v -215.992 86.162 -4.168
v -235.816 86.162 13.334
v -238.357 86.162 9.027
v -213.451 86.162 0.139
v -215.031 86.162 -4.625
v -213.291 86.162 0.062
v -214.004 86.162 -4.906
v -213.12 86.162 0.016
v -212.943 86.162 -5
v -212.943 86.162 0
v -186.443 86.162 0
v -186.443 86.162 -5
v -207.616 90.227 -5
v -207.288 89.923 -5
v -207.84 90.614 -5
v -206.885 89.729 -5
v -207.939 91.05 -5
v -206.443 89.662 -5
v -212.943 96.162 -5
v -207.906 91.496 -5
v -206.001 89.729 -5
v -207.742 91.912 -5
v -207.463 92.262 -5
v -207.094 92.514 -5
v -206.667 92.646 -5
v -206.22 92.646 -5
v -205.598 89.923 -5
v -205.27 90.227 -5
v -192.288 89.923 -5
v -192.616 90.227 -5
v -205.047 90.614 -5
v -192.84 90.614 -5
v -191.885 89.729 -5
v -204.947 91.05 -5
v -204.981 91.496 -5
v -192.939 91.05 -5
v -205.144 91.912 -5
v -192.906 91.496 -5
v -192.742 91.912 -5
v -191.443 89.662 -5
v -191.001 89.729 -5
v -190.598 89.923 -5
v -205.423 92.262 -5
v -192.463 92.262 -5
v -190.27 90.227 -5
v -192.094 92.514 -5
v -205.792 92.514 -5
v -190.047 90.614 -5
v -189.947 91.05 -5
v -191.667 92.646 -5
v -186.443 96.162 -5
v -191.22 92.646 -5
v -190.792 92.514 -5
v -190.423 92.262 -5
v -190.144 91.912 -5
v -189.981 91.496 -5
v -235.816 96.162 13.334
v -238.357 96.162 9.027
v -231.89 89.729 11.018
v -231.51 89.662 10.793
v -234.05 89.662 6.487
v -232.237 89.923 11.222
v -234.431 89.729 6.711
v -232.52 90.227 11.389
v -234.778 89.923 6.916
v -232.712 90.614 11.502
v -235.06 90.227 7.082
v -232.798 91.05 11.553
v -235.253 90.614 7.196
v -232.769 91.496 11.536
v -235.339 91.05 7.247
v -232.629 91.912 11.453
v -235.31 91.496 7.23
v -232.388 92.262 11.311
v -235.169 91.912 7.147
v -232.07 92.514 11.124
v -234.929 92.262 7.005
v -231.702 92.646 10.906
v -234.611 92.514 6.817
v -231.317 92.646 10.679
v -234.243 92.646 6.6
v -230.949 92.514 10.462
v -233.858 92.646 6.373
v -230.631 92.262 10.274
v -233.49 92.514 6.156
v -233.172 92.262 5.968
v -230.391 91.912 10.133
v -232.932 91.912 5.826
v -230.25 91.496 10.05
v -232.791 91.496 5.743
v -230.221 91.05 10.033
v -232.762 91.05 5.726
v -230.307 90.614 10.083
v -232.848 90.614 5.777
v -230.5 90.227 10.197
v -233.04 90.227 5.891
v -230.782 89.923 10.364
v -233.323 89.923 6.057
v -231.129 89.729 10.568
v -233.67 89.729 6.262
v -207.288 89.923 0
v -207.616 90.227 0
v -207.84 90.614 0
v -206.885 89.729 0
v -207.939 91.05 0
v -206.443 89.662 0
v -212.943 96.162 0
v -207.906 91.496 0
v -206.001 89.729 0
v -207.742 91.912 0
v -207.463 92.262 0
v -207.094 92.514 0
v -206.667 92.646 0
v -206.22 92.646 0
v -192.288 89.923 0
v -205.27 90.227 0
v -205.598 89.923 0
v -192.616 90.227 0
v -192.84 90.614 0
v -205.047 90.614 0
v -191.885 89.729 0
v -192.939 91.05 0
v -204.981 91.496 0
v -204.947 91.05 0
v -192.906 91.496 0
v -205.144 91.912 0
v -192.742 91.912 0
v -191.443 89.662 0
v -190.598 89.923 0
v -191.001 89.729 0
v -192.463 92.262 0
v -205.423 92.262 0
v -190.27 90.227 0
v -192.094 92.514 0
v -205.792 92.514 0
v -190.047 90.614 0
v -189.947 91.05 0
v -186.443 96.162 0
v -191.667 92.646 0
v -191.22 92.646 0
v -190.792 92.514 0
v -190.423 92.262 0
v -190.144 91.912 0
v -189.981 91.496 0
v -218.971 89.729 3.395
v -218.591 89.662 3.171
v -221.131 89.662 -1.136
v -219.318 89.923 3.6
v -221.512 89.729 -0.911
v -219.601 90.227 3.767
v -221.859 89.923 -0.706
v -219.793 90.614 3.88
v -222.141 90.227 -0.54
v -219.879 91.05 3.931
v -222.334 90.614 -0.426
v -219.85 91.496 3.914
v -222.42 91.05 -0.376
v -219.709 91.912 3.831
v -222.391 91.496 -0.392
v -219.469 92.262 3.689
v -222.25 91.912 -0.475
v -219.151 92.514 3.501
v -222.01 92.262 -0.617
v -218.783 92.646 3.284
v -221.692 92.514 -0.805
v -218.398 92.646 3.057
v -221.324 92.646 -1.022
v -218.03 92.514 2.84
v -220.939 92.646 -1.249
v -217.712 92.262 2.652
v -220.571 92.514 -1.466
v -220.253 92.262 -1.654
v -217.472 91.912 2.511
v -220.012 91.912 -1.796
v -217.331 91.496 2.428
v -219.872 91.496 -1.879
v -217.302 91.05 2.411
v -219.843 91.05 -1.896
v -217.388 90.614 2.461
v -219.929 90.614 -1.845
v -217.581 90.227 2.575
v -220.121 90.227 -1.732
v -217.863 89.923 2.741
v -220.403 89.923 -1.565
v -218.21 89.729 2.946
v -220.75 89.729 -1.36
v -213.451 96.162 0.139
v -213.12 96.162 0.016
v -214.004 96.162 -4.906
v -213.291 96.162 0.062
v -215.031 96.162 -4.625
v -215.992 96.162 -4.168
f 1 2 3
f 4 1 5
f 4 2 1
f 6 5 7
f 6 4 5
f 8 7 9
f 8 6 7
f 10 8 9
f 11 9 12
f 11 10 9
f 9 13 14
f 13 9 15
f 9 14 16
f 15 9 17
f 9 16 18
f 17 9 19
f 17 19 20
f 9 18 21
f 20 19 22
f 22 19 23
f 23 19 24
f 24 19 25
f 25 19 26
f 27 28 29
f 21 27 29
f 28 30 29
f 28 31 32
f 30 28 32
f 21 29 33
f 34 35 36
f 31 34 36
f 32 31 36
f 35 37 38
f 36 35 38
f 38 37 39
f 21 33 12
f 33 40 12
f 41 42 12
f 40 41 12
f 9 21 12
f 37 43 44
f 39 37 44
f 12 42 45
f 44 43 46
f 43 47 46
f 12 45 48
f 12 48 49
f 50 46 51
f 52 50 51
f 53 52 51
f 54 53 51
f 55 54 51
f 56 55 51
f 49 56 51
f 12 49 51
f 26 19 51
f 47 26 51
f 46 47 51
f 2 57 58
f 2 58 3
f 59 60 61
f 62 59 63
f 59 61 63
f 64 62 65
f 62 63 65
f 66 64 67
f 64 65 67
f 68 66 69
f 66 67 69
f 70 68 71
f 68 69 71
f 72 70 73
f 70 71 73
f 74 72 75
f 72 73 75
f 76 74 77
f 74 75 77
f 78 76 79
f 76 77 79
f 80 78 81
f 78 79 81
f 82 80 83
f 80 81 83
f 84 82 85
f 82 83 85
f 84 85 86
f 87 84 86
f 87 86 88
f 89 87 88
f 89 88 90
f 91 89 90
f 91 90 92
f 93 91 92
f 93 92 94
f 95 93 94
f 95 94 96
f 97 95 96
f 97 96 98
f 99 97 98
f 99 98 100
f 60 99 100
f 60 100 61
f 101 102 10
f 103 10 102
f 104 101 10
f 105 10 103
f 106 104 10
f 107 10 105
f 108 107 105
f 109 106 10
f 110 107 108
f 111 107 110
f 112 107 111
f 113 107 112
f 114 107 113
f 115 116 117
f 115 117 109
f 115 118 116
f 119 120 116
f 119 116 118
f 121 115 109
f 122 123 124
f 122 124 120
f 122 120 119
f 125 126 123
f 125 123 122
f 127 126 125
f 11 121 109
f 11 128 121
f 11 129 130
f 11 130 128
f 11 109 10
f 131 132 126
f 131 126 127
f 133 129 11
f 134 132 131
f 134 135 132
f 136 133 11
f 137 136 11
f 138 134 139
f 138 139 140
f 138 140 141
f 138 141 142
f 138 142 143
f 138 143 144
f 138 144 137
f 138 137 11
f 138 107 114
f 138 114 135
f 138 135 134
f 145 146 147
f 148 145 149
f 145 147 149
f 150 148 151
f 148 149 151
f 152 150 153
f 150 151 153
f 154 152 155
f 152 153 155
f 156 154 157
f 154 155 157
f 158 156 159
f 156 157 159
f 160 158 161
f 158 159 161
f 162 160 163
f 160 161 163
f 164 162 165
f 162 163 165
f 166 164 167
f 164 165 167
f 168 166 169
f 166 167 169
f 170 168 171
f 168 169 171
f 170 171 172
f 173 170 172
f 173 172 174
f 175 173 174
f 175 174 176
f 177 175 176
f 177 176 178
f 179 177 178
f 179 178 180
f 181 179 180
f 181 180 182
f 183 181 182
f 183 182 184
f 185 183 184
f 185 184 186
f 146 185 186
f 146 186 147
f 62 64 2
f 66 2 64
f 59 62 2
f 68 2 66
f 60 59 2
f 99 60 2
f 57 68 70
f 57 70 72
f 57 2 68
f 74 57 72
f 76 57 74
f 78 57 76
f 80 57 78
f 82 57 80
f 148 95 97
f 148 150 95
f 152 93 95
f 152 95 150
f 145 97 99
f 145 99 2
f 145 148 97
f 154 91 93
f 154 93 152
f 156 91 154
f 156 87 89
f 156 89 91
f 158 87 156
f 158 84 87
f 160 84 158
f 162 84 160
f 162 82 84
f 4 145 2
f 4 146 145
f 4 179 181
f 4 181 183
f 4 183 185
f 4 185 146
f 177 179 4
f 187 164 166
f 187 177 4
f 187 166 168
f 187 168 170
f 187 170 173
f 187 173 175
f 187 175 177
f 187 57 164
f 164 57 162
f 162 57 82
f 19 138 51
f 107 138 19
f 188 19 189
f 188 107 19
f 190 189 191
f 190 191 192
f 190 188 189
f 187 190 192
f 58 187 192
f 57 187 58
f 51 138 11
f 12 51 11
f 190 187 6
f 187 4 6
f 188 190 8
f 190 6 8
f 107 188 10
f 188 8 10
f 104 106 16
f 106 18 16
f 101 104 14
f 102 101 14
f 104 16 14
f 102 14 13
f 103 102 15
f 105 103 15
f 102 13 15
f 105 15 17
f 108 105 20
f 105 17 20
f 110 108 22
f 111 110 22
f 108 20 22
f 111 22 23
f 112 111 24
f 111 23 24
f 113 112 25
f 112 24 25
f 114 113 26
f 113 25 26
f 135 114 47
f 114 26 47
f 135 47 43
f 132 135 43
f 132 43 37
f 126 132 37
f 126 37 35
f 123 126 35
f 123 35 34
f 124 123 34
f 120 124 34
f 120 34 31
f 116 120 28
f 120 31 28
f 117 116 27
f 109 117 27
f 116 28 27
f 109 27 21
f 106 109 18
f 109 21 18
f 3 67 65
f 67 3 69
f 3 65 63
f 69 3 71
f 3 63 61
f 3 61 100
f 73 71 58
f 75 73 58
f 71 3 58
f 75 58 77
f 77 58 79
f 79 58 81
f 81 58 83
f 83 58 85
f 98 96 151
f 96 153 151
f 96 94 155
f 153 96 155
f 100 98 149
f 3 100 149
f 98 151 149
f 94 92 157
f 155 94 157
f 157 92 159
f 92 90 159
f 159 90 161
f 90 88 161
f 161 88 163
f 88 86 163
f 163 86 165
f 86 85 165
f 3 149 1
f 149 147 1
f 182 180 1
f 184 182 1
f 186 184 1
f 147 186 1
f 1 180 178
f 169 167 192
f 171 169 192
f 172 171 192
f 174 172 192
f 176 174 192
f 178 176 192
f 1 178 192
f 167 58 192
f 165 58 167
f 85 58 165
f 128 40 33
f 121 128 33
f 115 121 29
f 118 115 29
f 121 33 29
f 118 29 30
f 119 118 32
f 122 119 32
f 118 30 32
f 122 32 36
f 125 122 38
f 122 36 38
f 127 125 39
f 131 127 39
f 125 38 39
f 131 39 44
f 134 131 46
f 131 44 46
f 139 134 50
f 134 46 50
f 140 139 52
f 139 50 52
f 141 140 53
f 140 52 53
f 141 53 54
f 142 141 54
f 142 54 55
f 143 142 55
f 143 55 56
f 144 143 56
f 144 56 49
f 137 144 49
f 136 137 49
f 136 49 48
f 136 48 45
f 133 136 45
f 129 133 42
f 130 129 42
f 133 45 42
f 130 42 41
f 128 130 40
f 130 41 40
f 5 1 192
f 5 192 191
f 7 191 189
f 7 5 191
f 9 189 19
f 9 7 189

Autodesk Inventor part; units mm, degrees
ref_plane "YZ Plane" through (0, 0, 0) normal (1, 0, 0) x (0, 1, 0)
ref_plane "XZ Plane" through (0, 0, 0) normal (0, 1, 0) x (-1, 0, 0)
ref_plane "XY Plane" through (0, 0, 0) normal (0, 0, 1) x (1, 0, 0)
sketch "スケッチ1" plane through (0, 0, 0) normal (0, 0, 1) x (1, 0, 0)
  circle A0 centre (-137.47813, 108.715013) radius 1.5
  circle A1 centre (-137.47813, 108.715013) radius 4
  circle A2 centre (-84.833891, 108.084965) radius 1.5
  circle A3 centre (-84.833891, 108.084965) radius 4
  arc A4 (-118.947299, 71.123436) -> (-117.73095, 71.382243) centre (-118.502117, 72.018876) ccw
  arc A5 (-114.600271, 73.907195) -> (-117.73095, 71.382243) centre (-110, 65) ccw
  arc A6 (-114.600271, 73.907195) -> (-114.089743, 75.041147) centre (-115.059151, 74.795694) ccw
  line L0 (-114.089743, 75.041147) -> (-119.33341, 95.750821)
  arc A7 (-119.33341, 95.750821) -> (-120.080809, 96.480412) centre (-120.302818, 95.505368) ccw
  arc A8 (-121.730917, 97.23053) -> (-120.080809, 96.480412) centre (-119.081767, 100.868113) ccw
  arc A9 (-121.730917, 97.23053) -> (-122.772044, 97.31398) centre (-122.319616, 96.422178) ccw
  line L1 (-122.772044, 97.31398) -> (-145.176978, 85.94755)
  arc A10 (-145.176978, 85.94755) -> (-145.169733, 84.160308) centre (-144.724551, 85.055748) ccw
  line L2 (-145.169733, 84.160308) -> (-118.947299, 71.123436)
  arc A11 (-111.181518, 75.777506) -> (-110.19287, 75.023145) centre (-110.212109, 76.022959) ccw
  arc A12 (-100.681376, 68.696468) -> (-110.19287, 75.023145) centre (-110, 65) ccw
  arc A13 (-100.681376, 68.696468) -> (-99.603497, 68.076257) centre (-99.751838, 69.065193) ccw
  line L3 (-99.603497, 68.076257) -> (-77.042446, 71.460414)
  arc A14 (-77.042446, 71.460414) -> (-76.670938, 73.303609) centre (-77.190786, 72.449351) ccw
  line L4 (-76.670938, 73.303609) -> (-114.637331, 96.407596)
  arc A15 (-114.637331, 96.407596) -> (-116.126588, 95.307885) centre (-115.15718, 95.553338) ccw
  line L5 (-116.126588, 95.307885) -> (-111.181518, 75.777506)
  circle A16 centre (-150.294817, 85.033166) radius 1.5
  arc A17 (-124.129325, 99.989384) -> (-123.581755, 100.878808) centre (-124.581752, 100.881185) ccw
  arc A18 (-114.594354, 100.531773) -> (-123.581755, 100.878808) centre (-119.081767, 100.868113) ccw
  arc A19 (-114.594354, 100.531773) -> (-114.117, 99.602773) centre (-113.597151, 100.457031) ccw
  line L6 (-114.117, 99.602773) -> (-73.405222, 74.828115)
  arc A20 (-73.405222, 74.828115) -> (-72.36076, 74.831033) centre (-72.885373, 75.682374) ccw
  arc A21 (-73.660486, 68.382589) -> (-72.36076, 74.831033) centre (-70, 71) ccw
  arc A22 (-73.660486, 68.382589) -> (-74.622268, 68.789879) centre (-74.473928, 67.800942) ccw
  line L7 (-74.622268, 68.789879) -> (-99.158476, 65.109447)
  arc A23 (-99.158476, 65.109447) -> (-100.006948, 64.200283) centre (-99.010135, 64.120511) ccw
  arc A24 (-119.754961, 67.311137) -> (-100.006948, 64.200283) centre (-110, 65) ccw
  arc A25 (-119.754961, 67.311137) -> (-120.282843, 68.437115) centre (-120.728025, 67.541674) ccw
  line L8 (-120.282843, 68.437115) -> (-147.085218, 81.762313)
  arc A26 (-147.085218, 81.762313) -> (-148.083283, 81.700131) centre (-147.5304, 80.866873) ccw
  arc A27 (-148.11038, 88.384022) -> (-148.083283, 81.700131) centre (-150.294817, 85.033166) ccw
  arc A28 (-148.11038, 88.384022) -> (-147.111844, 88.329935) centre (-147.564271, 89.221736) ccw
  line L9 (-147.111844, 88.329935) -> (-124.129325, 99.989384)
  circle A29 centre (-110, 65) radius 7.025
  circle A30 centre (-119.081767, 100.868113) radius 1.5
  circle A31 centre (-70, 71) radius 1.5
  line L10 (-330.399972, 95) -> (-110, 65)
  circle A32 centre (-156.443214, 91.162336) radius 4
  circle A33 centre (-136.470623, 92.209055) radius 4
  line L11 (0, 0) -> (-155.794817, 0)
  line L12 (-329.051247, 104.90863) -> (-108.651275, 74.90863)
  circle A34 centre (-156.443214, 91.162336) radius 9
  circle A35 centre (-136.470623, 92.209055) radius 6
  line L13 (-156.443214, 91.162336) -> (-136.470623, 92.209055)
  circle A36 centre (-110, 65) radius 65
  circle A37 centre (-191.443214, 91.162336) radius 5
  line L14 (-191.443214, 91.162336) -> (-156.443214, 91.162336)
  line L15 (-191.443214, 91.162336) -> (-206.443214, 91.162336)
  circle A38 centre (-206.443214, 91.162336) radius 5
  line L16 (-206.443214, 91.162336) -> (-221.443214, 91.162336)
  circle A39 centre (-221.443214, 91.162336) radius 5
  line L17 (-221.443214, 91.162336) -> (-236.443214, 91.162336)
  circle A40 centre (-236.443214, 91.162336) radius 5
  line L18 (-206.843214, 96.14631) -> (-157.163214, 100.133489)
  line L19 (-206.843214, 86.178361) -> (-157.163214, 82.191182)
  line L20 (-135.882319, 98.180143) -> (-155.560758, 100.118968)
  line L21 (-154.629369, 82.34701) -> (-135.261393, 86.332171)
  circle A41 centre (-206.443214, 91.162336) radius 1.5
  circle A42 centre (-191.443214, 91.162336) radius 1.5
  line L22 (-236.443214, 91.162336) -> (-191.443214, 91.162336) construction
  line L23 (-236.443214, 86.162336) -> (-191.443214, 86.162336)
  line L24 (-191.443214, 96.162336) -> (-236.443214, 96.162336)
  arc A43 (-236.443214, 96.162336) -> (-236.443214, 86.162336) centre (-236.443214, 91.162336) ccw
  arc A44 (-191.443214, 86.162336) -> (-191.443214, 96.162336) centre (-191.443214, 91.162336) ccw
  point P0 (-202.811763, 87.725395)
  point P1 (-169.324077, 83.167179)
  point P2 (-153.510113, 82.653698)
  point P3 (-153.460125, 82.587594)
  point P4 (-191.336809, 86.163468)
  point P5 (-192.881846, 86.373772)
  point P6 (-213.943214, 91.162336)
  dimension "d0" = 8
  dimension "d1" = 8
  dimension "d2" = 95
  dimension "d3" = 7.75125
  dimension "d4" = 10
  dimension "d5" = 18
  dimension "d6" = 12
  dimension "d7" = 20
  dimension "d8" = 3
  dimension "d9" = 130
  dimension "d10" = 10
  dimension "d11" = 35
  dimension "d12" = 15
  dimension "d13" = 10
  dimension "d14" = 15
  dimension "d15" = 10
  dimension "d16" = 15
  dimension "d17" = 10
  dimension "d18" = 3
  dimension "d19" = 3
  dimension "d20" = 10
extrude "押し出し1" add sketch "スケッチ1" against normal blind 5 contours A37 L12 | L12 A37 L15 A42 L14 | L23 A39 L12 A38 L19 | L19 A38 L23 | A37 L23 A38 L12 | L12 A38 L15 A37 | L14 A42 L15 A37 | A38 L12 | L23 A40 L17 L12 A39 | A39 L12 | L12 A38 L16 A41 L15 | L15 A38 L24 A37 | A42 L15 L14 | L14 L15 A42 | L24 A38 L18 | L18 A38 L16 A39 L24 | L12 A39 L16 A38 | A39 L17 L16 L12 | L12 L17 A39 | L15 A41 L16 A38 | A39 L16 L17 | A39 L17 L12 A40 L24 | L17 A40 L12 | A41 L16 L15 | L15 L16 A41
hole "穴1" at (-206.443214, 91.162336, 0) at (-191.443214, 91.162336, 0) direction (0, 0, -1) diameter 3 depth 12 tip angle 118
sketch "スケッチ2" plane through (0, 0, 0) normal (0, 0, 1) x (1, 0, 0)
  circle A0 centre (-206.443214, 91.162336) radius 1.5
  circle A1 centre (-191.443214, 91.162336) radius 1.5
  line L0 (-236.443214, 96.162336) -> (-191.443214, 96.162336)
  arc A2 (-191.443214, 86.162336) -> (-191.443214, 96.162336) centre (-191.443214, 91.162336) ccw
  line L1 (-191.443214, 86.162336) -> (-236.443214, 86.162336)
  arc A3 (-236.443214, 96.162336) -> (-236.443214, 86.162336) centre (-236.443214, 91.162336) ccw
  line L2 (-236.443214, 96.162336) -> (-239.443214, 96.162336)
  line L3 (-239.443214, 96.162336) -> (-239.443214, 86.162336)
  line L4 (-191.443214, 86.162336) -> (-236.443214, 86.162336)
  line L5 (-239.443214, 86.162336) -> (-236.443214, 86.162336)
  arc A4 (-191.443214, 86.162336) -> (-191.443214, 96.162336) centre (-191.443214, 91.162336) ccw
  line L6 (-191.443214, 96.162336) -> (-186.443214, 96.162336)
  line L7 (-186.443214, 96.162336) -> (-186.443214, 86.162336)
  line L8 (-186.443214, 86.162336) -> (-191.443214, 86.162336)
  line L9 (-191.443214, 96.162336) -> (-236.443214, 96.162336)
  line L10 (-236.443214, 86.162336) -> (-191.443214, 86.162336)
  arc A5 (-236.443214, 96.162336) -> (-236.443214, 86.162336) centre (-236.443214, 91.162336) ccw
  circle A6 centre (-234.443214, 91.162336) radius 5
  circle A7 centre (-219.443214, 91.162336) radius 5
  circle A8 centre (-206.443214, 91.162336) radius 1.5
  circle A9 centre (-206.443214, 91.162336) radius 5
  point P0 (0, 0)
  point P1 (-239.443214, 87.162336)
  point P2 (-186.443214, 91.162336)
  point P3 (-239.443214, 87.162336)
  point P4 (-239.443214, 95.162336)
  point P5 (-234.443214, 86.162336)
  point P6 (-234.443214, 96.162336)
  point P7 (-239.443214, 95.162336)
  dimension "d32" = 53
  dimension "d33" = 10
  dimension "d34" = 10
  dimension "d35" = 15
  dimension "d36" = 15
  dimension "d46" = 10
extrude "押し出し2" add sketch "スケッチ2" against normal blind 5 contours L0 A6 L3 A3 | A3 L3 L2 | A6 | A6 L1 A3 L3 | A3 L5 L3 | L6 L7 A2 | L7 L8 A2
hole "穴2" at (-234.443214, 91.162336, 0) at (-219.443214, 91.162336, 0) direction (0, 0, -1) diameter 3 depth 12 tip angle 118
sketch "スケッチ3" plane through (0, 0, 0) normal (0, 0, 1) x (1, 0, 0)
  circle A0 centre (-219.443214, 91.162336) radius 1.5
  line L0 (-186.443214, 96.162336) -> (-186.443214, 86.162336)
  line L1 (-186.443214, 86.162336) -> (-239.443214, 86.162336)
  line L2 (-239.443214, 86.162336) -> (-239.443214, 96.162336)
  line L3 (-239.443214, 96.162336) -> (-186.443214, 96.162336)
  circle A1 centre (-206.443214, 91.162336) radius 1.5
  circle A2 centre (-191.443214, 91.162336) radius 1.5
  line L4 (-186.443214, 96.162336) -> (-239.443214, 96.162336)
  line L5 (-212.943214, 96.162336) -> (-212.943214, 86.162336)
  line L6 (-239.443214, 86.162336) -> (-186.443214, 86.162336)
  circle A3 centre (-234.443214, 91.162336) radius 1.5
  point P0 (0, 0)
bend part "曲げパーツ1" radius 1 angle 30.54 line through (-212.943214, 96.162336, 0) along (0, -1, 0) centre toward (0, 0, 1) moving side (-1, 0, 0) both sides no
equation "\"d36\" = d35"
properties part number "カウンター 取り付け根元曲げパーツ" material "アルミニウム 6061"
